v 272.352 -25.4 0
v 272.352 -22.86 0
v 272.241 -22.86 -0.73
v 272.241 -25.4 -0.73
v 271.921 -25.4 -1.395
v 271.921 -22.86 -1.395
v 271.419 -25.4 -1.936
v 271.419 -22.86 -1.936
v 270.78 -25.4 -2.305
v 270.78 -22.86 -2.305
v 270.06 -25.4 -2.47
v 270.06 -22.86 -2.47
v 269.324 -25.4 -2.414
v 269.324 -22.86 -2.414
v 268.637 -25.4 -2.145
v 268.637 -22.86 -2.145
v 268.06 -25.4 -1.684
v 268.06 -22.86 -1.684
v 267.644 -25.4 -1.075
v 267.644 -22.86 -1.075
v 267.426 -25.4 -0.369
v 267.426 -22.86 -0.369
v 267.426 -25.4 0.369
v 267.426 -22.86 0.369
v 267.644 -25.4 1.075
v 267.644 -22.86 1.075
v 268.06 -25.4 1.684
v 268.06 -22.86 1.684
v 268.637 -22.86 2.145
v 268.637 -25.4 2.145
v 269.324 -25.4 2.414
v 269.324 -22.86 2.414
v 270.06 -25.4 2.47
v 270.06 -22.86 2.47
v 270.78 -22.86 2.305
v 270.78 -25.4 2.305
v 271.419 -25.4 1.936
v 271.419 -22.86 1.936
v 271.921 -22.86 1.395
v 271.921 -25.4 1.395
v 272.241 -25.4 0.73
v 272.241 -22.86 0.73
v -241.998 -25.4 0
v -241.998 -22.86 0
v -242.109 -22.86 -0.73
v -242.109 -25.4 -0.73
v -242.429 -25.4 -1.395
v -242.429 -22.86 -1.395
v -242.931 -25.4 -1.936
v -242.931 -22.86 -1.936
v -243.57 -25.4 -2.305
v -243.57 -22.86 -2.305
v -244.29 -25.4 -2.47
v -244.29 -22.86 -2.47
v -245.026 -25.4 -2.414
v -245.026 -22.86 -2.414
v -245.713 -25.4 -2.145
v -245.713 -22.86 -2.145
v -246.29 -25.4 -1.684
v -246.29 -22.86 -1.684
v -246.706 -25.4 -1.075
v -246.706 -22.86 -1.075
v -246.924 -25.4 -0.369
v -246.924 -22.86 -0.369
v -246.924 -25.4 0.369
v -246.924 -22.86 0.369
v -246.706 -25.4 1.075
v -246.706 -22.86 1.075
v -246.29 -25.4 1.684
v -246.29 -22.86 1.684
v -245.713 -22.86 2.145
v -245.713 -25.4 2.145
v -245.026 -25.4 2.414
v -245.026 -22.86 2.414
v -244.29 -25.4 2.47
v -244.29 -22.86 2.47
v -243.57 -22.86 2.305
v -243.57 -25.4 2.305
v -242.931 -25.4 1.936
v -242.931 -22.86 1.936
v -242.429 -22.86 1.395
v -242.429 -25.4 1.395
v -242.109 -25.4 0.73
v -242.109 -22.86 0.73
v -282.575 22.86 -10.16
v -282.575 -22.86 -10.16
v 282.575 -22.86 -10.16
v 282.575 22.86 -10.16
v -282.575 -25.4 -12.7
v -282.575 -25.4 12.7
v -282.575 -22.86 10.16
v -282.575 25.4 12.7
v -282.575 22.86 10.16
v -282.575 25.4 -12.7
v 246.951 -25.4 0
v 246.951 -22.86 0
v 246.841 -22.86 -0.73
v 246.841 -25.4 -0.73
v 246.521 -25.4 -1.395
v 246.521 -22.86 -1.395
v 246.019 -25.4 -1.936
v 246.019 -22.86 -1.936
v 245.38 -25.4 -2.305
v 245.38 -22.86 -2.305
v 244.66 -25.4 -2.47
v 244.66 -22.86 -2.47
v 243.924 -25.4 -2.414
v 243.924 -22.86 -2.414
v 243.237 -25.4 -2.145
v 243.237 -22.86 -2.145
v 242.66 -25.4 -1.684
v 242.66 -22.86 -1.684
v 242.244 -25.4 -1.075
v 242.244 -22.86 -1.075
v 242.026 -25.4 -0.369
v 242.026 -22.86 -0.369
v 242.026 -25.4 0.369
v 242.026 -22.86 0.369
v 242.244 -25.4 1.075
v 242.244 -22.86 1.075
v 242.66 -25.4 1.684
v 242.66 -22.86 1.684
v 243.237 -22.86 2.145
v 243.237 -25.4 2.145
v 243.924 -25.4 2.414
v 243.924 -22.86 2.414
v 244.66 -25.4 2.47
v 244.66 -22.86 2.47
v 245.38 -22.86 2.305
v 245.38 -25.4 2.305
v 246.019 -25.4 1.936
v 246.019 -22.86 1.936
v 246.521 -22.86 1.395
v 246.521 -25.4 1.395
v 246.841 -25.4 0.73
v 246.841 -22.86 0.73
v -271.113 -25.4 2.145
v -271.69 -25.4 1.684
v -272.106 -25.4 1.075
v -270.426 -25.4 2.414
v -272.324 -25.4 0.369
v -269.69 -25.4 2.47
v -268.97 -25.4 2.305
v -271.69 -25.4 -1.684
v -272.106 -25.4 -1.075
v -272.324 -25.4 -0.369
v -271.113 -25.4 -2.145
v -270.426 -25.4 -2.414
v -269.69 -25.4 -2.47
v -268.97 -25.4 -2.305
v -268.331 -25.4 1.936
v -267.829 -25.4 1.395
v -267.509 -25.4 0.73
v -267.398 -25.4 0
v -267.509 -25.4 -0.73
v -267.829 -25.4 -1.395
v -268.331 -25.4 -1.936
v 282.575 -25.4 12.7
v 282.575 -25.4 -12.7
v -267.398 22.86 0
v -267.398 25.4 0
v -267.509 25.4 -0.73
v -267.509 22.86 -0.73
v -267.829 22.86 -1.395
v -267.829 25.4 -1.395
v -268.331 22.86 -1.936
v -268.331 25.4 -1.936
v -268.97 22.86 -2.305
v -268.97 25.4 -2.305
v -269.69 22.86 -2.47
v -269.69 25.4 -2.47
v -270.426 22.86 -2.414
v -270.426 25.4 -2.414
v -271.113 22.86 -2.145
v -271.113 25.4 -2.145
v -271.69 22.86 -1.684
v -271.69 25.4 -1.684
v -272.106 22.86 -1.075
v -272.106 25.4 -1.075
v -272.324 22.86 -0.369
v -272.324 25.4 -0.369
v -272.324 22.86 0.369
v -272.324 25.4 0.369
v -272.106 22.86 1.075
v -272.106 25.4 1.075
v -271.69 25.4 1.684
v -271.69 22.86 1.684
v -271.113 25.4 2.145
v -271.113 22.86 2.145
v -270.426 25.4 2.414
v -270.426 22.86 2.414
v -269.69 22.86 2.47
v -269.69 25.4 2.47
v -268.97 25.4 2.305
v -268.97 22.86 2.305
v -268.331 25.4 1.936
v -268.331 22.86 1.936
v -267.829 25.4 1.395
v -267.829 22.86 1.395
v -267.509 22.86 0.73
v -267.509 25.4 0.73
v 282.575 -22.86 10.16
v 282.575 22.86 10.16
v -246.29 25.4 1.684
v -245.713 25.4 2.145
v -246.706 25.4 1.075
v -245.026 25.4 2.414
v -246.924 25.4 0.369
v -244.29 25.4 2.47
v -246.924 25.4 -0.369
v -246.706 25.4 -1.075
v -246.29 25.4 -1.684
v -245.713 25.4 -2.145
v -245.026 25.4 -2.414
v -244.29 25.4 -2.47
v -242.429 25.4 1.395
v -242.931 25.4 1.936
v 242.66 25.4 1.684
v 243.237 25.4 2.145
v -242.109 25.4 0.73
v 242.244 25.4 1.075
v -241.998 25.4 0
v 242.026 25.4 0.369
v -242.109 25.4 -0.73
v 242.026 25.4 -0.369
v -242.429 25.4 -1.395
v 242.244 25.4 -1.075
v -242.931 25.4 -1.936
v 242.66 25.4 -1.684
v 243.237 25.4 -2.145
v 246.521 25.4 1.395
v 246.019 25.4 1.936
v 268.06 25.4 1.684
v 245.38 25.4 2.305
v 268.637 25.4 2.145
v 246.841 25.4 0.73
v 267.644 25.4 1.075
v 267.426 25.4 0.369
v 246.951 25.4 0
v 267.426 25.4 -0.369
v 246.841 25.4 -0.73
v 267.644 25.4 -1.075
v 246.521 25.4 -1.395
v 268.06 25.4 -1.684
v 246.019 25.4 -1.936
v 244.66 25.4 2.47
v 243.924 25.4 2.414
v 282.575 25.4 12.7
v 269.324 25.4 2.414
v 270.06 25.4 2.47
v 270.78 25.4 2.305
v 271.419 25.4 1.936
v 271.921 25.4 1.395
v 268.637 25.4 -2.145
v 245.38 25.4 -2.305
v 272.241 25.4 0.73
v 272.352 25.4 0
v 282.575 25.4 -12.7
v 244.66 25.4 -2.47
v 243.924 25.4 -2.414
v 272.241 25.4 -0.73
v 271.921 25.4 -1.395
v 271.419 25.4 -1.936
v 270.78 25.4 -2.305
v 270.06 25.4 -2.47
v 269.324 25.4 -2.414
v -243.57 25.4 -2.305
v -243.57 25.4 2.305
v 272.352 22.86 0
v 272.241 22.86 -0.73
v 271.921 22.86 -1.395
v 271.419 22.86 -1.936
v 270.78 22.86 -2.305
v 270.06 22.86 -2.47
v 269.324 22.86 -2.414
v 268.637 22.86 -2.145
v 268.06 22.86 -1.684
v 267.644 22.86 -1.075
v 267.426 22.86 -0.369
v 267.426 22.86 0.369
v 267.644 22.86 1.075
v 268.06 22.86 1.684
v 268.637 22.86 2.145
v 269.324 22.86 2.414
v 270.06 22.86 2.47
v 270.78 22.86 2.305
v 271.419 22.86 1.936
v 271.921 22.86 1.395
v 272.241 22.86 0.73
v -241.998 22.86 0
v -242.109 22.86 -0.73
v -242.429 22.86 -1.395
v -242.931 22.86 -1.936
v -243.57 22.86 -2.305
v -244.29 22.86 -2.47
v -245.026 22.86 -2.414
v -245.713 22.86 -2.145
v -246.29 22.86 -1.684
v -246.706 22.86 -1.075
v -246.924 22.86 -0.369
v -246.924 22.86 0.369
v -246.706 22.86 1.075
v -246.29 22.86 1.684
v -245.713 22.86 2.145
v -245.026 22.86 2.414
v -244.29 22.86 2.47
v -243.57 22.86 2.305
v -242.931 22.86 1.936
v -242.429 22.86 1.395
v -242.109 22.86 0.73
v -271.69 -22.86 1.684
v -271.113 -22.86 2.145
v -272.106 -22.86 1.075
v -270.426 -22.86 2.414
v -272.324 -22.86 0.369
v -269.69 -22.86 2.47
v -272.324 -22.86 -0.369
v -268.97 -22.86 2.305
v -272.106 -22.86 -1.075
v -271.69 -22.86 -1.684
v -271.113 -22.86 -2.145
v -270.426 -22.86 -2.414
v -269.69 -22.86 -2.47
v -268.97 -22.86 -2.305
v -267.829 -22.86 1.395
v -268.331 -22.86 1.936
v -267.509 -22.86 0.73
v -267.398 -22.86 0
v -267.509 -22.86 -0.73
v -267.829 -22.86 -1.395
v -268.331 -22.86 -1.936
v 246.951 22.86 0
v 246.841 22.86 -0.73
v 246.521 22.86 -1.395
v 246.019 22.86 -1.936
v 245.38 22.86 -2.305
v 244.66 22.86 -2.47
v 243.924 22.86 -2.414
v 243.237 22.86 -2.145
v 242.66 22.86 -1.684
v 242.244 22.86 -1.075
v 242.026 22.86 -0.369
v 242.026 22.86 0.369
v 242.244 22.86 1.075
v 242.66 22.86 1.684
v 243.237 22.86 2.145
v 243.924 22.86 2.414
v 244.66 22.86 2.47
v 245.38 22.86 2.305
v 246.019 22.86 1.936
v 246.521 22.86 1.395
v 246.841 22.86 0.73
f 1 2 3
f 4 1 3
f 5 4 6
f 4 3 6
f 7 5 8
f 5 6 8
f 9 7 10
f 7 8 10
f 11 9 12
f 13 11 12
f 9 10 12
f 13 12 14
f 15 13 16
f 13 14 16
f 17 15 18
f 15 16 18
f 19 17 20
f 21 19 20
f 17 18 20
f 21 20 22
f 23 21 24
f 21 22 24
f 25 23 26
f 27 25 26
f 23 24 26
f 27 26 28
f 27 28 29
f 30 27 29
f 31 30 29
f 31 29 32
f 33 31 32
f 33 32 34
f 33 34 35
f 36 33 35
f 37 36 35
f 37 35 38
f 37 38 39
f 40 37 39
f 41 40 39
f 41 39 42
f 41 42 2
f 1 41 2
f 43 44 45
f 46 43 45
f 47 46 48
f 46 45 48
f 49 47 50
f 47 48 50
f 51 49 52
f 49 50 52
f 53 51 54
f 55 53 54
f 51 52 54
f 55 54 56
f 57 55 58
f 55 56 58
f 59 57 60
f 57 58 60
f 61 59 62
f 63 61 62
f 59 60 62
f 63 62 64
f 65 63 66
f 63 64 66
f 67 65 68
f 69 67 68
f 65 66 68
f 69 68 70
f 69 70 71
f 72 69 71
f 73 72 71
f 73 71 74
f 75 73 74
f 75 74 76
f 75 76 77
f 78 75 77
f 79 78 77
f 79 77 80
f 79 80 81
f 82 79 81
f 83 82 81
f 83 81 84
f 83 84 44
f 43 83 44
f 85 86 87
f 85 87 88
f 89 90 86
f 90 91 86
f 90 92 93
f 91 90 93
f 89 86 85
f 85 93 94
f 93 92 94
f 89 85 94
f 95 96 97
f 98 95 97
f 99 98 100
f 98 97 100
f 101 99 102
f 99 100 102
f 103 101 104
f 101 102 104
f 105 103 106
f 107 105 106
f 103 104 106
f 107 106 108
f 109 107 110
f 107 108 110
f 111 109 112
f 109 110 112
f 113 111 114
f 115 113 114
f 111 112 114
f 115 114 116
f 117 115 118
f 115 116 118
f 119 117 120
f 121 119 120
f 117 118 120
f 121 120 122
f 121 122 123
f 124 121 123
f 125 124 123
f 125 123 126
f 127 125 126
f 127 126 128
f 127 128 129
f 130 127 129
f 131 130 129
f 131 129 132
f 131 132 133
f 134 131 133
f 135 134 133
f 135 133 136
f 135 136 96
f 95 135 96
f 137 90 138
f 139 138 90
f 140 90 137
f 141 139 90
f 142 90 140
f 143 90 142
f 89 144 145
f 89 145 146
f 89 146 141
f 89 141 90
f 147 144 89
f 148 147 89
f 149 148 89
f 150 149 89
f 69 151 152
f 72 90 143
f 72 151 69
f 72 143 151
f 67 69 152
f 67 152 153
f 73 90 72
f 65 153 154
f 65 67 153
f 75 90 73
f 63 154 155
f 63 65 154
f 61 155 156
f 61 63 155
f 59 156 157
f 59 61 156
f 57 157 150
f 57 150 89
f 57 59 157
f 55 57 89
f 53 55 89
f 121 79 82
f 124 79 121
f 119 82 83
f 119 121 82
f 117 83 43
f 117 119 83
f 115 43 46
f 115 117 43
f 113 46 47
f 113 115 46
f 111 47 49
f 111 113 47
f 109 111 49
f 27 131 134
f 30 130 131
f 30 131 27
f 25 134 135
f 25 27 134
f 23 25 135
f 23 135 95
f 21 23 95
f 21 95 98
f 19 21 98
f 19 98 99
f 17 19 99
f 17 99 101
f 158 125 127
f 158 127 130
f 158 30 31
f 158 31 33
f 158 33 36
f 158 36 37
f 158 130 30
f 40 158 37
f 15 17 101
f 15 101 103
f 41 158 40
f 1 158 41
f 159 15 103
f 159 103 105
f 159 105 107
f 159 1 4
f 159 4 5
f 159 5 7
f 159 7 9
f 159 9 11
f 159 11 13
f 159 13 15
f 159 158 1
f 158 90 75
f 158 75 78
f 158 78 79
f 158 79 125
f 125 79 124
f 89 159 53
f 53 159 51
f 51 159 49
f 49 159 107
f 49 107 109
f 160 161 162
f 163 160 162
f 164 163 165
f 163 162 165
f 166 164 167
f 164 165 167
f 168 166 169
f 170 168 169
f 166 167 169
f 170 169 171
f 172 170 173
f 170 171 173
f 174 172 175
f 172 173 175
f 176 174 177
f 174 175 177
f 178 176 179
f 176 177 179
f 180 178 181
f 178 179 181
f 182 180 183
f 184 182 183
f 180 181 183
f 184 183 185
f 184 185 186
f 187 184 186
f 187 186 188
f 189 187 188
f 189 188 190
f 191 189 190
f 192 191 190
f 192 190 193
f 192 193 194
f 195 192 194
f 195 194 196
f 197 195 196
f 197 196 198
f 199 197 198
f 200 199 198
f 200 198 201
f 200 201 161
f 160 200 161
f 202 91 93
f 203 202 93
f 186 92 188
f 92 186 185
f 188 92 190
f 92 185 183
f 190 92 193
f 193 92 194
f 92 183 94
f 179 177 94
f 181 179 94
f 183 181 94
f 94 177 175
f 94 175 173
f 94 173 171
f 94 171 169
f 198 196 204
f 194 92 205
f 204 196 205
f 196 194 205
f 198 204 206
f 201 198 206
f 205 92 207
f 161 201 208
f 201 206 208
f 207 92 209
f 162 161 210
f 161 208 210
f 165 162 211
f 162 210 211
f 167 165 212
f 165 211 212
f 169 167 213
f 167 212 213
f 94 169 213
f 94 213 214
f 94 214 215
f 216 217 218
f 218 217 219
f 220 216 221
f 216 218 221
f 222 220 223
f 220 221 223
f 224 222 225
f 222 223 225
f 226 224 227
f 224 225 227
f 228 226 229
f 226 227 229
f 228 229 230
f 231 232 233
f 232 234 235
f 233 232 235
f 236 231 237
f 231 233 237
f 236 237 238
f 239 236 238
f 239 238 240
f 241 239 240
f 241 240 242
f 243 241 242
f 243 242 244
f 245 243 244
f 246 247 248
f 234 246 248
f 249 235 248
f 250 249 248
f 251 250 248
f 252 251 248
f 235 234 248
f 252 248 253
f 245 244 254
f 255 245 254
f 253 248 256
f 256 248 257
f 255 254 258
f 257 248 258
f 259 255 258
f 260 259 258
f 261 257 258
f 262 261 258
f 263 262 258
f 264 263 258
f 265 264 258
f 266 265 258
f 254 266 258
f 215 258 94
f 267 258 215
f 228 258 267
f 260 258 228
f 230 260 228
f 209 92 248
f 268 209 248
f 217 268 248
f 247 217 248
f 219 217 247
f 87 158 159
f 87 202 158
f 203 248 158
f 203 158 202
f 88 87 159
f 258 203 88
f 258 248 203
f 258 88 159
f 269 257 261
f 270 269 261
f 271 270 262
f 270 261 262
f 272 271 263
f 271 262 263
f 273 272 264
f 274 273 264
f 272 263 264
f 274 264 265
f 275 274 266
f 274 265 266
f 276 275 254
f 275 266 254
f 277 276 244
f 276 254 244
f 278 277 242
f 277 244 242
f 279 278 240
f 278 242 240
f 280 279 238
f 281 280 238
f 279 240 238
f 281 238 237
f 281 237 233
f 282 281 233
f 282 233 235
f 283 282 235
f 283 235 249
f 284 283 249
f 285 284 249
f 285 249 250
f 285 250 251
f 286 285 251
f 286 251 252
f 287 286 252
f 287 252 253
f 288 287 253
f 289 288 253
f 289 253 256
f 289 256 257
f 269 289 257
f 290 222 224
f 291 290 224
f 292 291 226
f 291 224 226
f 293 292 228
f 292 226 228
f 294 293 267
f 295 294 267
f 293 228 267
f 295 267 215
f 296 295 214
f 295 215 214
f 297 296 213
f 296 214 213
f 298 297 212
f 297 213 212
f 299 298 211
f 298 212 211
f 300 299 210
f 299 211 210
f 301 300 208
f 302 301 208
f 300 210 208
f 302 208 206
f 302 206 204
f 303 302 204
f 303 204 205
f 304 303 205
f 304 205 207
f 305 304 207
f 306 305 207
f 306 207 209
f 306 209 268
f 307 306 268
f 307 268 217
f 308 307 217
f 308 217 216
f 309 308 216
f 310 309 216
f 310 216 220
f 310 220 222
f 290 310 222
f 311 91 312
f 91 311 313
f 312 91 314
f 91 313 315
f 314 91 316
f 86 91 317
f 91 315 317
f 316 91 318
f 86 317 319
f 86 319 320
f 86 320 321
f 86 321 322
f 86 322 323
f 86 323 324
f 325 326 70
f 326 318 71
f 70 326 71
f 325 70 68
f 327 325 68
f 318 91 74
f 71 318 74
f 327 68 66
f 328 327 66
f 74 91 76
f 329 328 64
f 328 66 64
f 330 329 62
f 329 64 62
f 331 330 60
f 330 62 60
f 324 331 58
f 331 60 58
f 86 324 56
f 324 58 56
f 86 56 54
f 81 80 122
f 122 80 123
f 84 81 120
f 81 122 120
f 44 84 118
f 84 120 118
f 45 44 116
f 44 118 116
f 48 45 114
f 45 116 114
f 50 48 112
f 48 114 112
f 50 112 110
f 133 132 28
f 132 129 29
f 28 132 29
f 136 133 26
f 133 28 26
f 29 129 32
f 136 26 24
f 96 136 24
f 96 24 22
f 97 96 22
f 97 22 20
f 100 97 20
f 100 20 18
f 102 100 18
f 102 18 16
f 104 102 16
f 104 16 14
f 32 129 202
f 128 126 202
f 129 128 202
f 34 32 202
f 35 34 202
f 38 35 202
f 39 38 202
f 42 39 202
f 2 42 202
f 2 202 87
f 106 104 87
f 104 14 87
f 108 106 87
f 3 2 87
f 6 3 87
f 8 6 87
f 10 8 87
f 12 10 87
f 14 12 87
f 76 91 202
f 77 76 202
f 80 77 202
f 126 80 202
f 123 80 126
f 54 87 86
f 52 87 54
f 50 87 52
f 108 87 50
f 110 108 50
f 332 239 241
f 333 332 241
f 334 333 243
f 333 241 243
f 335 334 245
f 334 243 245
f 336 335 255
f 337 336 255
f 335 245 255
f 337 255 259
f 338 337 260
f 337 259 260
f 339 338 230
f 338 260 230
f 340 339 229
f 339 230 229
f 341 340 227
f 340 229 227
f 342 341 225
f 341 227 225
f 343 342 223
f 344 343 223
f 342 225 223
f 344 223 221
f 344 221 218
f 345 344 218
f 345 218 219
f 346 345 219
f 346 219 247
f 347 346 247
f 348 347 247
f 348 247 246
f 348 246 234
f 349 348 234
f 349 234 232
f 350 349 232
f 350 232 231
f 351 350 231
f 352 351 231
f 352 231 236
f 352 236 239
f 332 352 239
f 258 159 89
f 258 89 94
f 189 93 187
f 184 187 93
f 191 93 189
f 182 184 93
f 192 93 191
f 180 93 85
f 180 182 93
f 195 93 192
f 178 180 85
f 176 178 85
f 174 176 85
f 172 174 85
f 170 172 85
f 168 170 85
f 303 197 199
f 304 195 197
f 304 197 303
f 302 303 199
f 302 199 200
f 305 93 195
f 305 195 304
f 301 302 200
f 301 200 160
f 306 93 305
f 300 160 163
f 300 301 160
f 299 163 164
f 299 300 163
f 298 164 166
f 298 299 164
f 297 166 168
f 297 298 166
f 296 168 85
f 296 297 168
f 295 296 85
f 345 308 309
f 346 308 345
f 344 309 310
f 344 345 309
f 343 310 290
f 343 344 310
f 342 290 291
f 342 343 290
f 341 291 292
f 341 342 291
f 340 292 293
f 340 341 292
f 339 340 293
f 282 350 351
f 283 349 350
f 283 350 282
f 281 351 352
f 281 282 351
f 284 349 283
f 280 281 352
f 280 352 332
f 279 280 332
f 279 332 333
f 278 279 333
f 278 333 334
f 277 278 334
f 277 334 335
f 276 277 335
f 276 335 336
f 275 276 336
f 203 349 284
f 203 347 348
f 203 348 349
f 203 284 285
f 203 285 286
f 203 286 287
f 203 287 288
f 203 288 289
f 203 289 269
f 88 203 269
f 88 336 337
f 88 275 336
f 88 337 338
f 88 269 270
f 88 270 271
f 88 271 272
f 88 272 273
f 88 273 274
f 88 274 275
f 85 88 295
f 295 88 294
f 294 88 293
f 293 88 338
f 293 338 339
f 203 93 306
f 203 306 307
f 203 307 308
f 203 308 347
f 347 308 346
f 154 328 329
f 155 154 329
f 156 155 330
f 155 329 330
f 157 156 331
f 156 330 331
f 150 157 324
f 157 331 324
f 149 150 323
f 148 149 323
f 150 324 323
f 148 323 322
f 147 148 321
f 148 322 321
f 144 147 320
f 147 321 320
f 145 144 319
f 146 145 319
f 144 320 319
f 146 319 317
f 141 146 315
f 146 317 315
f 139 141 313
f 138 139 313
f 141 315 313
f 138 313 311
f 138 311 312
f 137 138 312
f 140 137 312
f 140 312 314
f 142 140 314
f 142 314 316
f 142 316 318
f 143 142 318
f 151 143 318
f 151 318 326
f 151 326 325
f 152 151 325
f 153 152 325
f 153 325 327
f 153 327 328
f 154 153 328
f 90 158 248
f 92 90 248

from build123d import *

# Parameters (mm, degrees)
SKETCH1_W           = 25.4
SKETCH1_H           = 50.8
SKETCH1_W_2         = 20.32
SKETCH1_H_2         = 45.72
EXTRUDE_THIN1_DEPTH = 282.575
SKETCH2_R           = 2.4765
CUT_EXTRUDE1_DEPTH  = 51.8


with BuildPart() as part:
    # Sketch1 → Extrude-Thin1 (new body, symmetric)
    with BuildSketch(Plane(origin=(0, 0, 0), x_dir=(0, 0, -1), z_dir=(1, 0, 0))):
        Rectangle(SKETCH1_W, SKETCH1_H)
        Rectangle(SKETCH1_W_2, SKETCH1_H_2, mode=Mode.SUBTRACT)
    extrude(amount=EXTRUDE_THIN1_DEPTH, both=True)

    # Sketch2 → Cut-Extrude1 (cut, through all)
    with BuildSketch(Plane(origin=(0, 25.4, 0), x_dir=(1, 0, 0), z_dir=(0, 1, 0))):
        with Locations((-269.875, 0)):
            Circle(SKETCH2_R)
        with Locations((-244.475, 0)):
            Circle(SKETCH2_R)
        with Locations((269.875, 0)):
            Circle(SKETCH2_R)
        with Locations((244.475, 0)):
            Circle(SKETCH2_R)
    extrude(amount=-CUT_EXTRUDE1_DEPTH, mode=Mode.SUBTRACT)


solid = part.part
